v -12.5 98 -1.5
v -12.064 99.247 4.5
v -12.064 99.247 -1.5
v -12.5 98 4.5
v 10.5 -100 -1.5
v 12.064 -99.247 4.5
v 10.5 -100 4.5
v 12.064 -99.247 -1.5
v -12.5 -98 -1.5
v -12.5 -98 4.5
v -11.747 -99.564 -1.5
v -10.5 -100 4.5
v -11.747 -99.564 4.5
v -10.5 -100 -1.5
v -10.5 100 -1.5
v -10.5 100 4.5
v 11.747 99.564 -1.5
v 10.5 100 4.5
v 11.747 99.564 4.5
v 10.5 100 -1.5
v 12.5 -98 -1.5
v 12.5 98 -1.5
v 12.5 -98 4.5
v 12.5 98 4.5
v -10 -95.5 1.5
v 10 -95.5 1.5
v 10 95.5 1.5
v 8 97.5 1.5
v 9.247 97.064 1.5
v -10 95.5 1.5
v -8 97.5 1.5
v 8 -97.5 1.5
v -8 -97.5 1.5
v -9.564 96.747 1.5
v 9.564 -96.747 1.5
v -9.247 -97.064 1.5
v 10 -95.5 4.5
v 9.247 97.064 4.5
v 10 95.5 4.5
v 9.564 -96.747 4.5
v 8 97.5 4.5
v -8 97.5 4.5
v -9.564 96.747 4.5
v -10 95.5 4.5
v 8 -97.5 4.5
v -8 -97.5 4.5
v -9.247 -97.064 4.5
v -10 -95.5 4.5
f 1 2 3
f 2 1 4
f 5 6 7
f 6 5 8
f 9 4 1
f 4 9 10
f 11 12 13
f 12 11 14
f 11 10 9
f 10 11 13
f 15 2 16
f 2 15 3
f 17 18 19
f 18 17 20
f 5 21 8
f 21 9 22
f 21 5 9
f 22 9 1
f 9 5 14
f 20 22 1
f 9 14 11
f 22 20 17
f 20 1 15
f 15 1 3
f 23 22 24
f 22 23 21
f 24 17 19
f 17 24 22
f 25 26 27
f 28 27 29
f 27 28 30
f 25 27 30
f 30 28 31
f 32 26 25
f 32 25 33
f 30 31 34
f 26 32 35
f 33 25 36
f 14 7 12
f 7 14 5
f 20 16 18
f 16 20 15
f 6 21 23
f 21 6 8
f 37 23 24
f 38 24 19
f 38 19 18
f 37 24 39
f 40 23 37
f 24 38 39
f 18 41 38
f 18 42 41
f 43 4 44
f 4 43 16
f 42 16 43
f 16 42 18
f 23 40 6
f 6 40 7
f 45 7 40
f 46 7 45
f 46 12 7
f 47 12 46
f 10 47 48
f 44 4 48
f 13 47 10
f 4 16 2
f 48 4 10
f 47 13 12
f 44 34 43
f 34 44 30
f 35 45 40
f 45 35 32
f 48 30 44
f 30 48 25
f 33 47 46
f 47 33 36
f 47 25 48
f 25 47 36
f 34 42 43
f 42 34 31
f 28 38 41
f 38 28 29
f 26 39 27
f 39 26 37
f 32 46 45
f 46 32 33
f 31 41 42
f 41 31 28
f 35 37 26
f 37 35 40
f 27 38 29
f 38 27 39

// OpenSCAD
/*
 * Tao Steps
 */
 echo(version=version());

logo = "steps.tao.png"; // res 1560x3130
logox = 3130; 
logoy = 1560; 

module roundedRect(size, radius) {  
	linear_extrude(height=size.z, center=true) {
		offset(radius) offset(-radius) {
			square([size.x, size.y], center = true);
		}
	}
}


// Base plate
// ----------
plateWidth = 25;
plateLength = 200;
plateThickNess = 3;
cornerRadius = 2;
//color("green") {
difference() {  
	union() {
		difference() {
			roundedRect([plateWidth, plateLength, plateThickNess], cornerRadius);
			translate([0, 0, 2]) {
				scale([.9 * (plateLength / 4) / logox, .9 * plateWidth / logoy, .02]) {
					color("white") {
						rotate([0, 0, -0]) {
							surface(file=logo, invert=true, center=true);
						}
					}
				}
        // the groove around the picture
        //difference() {
        //  roundedRect([plateWidth -  5, plateLength -  5, plateThickNess], cornerRadius);
        //  roundedRect([plateWidth - 10, plateLength - 10, plateThickNess * 1.1], cornerRadius);
        //}
			}
		}
		// The frame
		translate([0, 0, (plateThickNess / 1)]) {
			difference() {
				roundedRect([plateWidth, plateLength, plateThickNess], cornerRadius);
				roundedRect([plateWidth - 5, plateLength - 5, plateThickNess * 1.1], cornerRadius);
			}
		}
	}
}
//}
